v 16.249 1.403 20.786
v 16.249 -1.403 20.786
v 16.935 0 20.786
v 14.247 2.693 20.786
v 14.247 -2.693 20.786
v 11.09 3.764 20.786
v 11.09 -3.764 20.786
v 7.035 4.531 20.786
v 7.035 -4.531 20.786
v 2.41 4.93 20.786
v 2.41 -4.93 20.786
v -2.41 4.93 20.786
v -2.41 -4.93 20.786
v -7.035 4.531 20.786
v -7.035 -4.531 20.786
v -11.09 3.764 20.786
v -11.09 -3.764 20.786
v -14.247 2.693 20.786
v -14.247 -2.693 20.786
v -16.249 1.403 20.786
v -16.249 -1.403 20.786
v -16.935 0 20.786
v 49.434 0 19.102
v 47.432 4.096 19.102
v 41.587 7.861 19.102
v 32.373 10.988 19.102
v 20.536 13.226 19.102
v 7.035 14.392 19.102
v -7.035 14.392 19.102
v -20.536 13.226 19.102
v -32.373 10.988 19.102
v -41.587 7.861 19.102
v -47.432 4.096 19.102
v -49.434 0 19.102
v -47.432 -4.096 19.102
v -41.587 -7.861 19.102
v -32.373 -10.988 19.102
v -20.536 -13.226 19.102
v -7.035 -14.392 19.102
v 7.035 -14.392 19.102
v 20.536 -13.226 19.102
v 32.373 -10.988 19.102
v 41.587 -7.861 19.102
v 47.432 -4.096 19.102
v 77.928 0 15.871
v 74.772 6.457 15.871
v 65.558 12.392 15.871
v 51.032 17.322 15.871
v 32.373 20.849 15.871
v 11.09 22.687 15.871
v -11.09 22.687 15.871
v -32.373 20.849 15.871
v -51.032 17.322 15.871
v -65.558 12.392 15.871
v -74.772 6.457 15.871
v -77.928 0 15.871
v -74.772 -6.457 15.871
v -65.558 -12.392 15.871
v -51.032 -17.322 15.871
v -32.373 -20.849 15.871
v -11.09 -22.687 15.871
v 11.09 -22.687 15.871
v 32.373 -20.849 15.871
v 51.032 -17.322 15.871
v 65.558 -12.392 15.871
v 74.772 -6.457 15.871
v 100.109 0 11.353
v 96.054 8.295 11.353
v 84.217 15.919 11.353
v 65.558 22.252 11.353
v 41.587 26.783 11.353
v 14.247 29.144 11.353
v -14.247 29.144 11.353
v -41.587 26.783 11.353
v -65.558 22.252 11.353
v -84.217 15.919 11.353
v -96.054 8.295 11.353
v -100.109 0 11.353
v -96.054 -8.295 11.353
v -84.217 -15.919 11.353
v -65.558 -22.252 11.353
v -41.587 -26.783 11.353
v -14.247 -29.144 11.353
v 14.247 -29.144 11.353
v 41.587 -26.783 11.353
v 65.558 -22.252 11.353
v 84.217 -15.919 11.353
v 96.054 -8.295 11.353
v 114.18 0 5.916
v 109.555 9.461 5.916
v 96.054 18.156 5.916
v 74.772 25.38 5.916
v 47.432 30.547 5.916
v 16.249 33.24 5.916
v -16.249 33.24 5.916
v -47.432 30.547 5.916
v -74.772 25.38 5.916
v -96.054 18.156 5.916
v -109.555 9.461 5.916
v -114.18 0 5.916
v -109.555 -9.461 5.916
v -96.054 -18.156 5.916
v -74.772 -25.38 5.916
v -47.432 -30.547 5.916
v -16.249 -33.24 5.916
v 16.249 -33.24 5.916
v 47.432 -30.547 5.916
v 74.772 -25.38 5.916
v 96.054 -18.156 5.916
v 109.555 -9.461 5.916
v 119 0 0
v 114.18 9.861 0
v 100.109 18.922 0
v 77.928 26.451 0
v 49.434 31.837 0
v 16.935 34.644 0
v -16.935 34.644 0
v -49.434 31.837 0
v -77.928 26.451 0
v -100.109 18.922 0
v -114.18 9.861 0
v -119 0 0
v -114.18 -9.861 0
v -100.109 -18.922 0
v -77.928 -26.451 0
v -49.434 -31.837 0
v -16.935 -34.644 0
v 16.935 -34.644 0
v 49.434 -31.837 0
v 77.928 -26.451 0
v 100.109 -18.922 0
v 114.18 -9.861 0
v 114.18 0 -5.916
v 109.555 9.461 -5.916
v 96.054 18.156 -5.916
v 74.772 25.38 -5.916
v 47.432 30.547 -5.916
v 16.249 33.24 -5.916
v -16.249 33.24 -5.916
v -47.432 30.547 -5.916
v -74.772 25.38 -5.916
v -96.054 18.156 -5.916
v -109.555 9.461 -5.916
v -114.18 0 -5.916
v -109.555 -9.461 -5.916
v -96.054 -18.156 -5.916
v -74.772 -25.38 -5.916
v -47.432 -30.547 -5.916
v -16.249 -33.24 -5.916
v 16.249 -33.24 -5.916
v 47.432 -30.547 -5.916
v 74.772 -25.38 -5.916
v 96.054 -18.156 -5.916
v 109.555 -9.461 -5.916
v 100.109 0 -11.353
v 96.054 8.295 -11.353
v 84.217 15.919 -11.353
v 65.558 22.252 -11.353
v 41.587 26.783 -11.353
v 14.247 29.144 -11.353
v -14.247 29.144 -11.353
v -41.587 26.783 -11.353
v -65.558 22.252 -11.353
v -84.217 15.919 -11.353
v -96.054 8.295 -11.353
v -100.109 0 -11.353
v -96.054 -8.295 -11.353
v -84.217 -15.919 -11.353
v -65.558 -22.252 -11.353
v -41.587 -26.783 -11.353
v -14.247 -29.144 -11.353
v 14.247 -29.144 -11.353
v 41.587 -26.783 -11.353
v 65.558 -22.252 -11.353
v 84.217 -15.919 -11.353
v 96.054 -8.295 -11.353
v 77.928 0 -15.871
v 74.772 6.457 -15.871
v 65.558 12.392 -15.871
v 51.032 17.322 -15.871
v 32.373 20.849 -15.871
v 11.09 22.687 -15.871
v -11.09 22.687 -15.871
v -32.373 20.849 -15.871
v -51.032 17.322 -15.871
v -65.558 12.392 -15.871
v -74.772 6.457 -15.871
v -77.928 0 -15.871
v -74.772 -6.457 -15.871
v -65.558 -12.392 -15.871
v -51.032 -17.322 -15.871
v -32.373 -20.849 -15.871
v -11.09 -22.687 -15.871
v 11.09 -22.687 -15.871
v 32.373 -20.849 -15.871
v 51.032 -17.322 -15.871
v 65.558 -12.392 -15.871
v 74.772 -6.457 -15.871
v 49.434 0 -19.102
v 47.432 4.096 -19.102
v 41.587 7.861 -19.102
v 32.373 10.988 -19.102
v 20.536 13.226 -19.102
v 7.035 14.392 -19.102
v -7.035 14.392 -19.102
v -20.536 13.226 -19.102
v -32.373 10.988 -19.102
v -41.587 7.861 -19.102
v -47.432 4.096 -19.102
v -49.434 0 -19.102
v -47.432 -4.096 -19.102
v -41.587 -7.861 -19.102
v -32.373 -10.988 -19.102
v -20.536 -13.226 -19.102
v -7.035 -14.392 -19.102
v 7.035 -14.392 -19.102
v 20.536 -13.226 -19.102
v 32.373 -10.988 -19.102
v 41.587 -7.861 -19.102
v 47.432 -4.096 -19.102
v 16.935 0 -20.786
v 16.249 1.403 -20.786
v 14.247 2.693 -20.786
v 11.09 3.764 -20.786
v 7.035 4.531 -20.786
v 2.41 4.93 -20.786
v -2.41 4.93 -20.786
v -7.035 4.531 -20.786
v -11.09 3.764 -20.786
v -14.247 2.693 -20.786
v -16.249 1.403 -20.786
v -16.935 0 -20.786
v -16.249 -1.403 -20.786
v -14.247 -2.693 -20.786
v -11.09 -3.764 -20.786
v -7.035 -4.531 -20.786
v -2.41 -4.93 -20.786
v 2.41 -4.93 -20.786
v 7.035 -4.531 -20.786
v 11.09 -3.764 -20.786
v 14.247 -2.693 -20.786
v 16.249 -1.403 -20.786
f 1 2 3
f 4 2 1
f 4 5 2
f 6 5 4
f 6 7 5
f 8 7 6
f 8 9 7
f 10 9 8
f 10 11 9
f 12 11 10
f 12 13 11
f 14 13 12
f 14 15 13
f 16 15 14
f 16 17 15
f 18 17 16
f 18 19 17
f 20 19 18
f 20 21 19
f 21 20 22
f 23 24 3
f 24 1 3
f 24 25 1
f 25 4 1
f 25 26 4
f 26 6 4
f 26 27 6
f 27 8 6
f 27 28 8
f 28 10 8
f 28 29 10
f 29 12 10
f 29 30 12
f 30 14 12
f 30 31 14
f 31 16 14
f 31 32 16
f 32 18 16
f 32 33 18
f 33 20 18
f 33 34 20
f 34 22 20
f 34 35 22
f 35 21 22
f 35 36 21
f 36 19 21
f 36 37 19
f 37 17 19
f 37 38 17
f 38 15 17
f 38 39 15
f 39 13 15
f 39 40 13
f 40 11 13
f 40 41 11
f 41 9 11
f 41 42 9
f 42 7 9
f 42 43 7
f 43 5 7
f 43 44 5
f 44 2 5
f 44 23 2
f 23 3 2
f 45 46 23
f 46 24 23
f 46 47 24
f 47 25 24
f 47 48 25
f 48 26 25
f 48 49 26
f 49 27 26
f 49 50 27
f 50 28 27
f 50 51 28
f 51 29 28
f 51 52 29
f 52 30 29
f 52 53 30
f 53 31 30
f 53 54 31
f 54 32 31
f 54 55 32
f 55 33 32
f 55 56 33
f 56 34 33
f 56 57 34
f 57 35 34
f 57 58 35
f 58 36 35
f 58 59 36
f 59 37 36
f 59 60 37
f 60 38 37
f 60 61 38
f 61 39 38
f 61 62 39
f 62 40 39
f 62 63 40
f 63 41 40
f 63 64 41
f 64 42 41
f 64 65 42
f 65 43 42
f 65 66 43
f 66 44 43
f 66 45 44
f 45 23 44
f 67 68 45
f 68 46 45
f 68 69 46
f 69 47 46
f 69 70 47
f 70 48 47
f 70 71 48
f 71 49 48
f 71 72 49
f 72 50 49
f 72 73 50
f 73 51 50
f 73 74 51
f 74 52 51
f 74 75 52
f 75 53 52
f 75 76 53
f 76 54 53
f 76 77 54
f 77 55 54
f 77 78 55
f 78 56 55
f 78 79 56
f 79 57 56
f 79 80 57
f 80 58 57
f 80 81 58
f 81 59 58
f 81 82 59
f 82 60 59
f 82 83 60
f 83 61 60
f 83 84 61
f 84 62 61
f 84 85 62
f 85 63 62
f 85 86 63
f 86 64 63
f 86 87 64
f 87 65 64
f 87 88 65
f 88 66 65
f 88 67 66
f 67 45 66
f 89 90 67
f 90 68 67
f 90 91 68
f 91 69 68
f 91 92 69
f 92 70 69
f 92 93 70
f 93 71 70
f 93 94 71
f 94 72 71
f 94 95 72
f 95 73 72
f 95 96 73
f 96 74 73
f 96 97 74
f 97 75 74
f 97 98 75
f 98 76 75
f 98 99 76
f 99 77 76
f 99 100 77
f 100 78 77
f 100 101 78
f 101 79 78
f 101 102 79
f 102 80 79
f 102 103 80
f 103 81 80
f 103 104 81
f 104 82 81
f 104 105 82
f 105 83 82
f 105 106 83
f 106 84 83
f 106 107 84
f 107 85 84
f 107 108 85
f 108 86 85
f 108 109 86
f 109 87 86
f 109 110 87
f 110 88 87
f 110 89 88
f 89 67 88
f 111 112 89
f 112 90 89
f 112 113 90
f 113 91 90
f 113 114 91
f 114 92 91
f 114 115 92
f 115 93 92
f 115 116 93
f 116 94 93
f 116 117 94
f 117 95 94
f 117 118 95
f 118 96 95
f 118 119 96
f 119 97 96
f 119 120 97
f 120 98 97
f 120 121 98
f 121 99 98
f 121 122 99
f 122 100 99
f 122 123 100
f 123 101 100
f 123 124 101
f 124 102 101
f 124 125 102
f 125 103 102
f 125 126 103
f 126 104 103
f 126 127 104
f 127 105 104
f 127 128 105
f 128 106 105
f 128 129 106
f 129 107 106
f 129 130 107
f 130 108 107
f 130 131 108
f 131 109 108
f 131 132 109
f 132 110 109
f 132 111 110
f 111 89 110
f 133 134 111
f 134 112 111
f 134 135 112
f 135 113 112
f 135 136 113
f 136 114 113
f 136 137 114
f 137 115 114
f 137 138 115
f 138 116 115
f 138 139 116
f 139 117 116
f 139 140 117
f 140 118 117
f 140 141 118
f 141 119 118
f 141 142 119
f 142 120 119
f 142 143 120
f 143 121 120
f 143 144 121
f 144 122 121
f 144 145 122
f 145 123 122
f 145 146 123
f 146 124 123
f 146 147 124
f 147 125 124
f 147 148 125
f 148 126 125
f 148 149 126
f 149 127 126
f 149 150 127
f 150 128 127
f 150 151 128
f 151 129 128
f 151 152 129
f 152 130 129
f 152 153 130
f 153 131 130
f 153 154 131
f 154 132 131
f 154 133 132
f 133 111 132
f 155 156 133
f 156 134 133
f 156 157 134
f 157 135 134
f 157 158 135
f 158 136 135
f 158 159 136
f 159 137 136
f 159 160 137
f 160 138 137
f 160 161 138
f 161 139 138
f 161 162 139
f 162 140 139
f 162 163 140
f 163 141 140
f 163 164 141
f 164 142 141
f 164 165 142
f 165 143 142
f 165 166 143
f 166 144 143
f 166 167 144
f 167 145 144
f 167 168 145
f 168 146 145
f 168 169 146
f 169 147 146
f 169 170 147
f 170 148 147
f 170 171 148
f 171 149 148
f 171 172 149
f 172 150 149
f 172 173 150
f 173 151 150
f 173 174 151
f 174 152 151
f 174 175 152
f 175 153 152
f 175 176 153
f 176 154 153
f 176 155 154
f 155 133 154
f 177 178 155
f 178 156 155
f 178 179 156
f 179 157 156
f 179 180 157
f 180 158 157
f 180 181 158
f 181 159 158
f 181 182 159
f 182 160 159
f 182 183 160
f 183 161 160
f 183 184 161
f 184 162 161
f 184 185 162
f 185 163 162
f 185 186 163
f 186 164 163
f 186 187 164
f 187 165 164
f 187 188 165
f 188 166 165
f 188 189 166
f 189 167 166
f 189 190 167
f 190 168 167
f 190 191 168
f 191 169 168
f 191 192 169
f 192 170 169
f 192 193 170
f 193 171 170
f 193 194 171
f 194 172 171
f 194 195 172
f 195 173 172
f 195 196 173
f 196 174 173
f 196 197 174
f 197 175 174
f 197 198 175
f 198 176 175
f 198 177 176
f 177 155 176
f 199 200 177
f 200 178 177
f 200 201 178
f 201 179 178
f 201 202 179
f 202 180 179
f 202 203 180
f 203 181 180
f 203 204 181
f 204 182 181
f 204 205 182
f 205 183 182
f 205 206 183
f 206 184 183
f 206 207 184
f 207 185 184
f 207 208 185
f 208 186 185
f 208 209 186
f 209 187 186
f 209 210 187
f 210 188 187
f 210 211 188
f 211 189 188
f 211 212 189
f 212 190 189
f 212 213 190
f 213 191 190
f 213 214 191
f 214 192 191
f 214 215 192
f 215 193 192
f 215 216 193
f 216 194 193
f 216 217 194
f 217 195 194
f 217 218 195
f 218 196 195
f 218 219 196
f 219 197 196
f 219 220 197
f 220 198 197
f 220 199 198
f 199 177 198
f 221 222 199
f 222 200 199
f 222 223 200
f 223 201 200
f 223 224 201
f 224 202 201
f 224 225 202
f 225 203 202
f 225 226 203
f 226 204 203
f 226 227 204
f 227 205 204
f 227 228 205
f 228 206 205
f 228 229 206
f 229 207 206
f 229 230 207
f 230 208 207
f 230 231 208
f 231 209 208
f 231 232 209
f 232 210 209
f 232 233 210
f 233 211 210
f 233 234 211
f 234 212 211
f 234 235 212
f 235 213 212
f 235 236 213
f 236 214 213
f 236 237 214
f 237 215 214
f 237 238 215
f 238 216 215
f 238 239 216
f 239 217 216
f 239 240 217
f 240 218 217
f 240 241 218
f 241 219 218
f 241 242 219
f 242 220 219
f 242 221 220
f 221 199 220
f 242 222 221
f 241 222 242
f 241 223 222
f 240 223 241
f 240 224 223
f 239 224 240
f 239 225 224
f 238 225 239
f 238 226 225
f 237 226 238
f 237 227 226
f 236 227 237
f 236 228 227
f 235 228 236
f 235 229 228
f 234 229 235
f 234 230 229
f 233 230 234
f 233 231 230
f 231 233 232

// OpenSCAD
// Generated by SolidPython 1.0.1 on 2020-07-29 00:46:52


scale(v = [17, 5, 3]) {
	sphere(r = 7);
}
/***********************************************
*********      SolidPython code:      **********
************************************************
 
# import packages: SolidPython
from solid import *
from solid.utils import *
from itertools import chain, combinations, permutations


class Resize:

    def __init__(self, scad_file):
        self.scad_file = scad_file
        #self.scad_file = import_scad(scad_file)
        # cone/cylinder param:
        self.r1 = 0
        self.r2 = 0
        self.h = 0
        # rectangular prism param:
        self.w = 0
        self.l = 0
        # ellipse param:
        self.r = 0

    # import OpenScad code (file name corresponds to shape)


    # classify shape + parameters
    def assign(self, param1, param2, param3):
        if self.scad_file == 'cone.scad':
            self.r1 = param1
            self.r2 = param2
            self.h = param3
        elif self.scad_file == 'cylinder.scad':
            self.r1 = param1
            self.r2 = param2
            self.h = param3
        elif self.scad_file == 'rectangularPrism.scad':
            self.h = param1
            self.l = param2
            self.w = param3
        else:
            self.r = param1
            self.h = param2

    # resize parameters
    def iterate(self):
        x = range(3, 20, 2)
        i = 1
        if self.scad_file == 'cone.scad':
            tempList = list(permutations(x, 2))
            for temp in tempList:
                param1 = temp[0]
                param2 = temp[1]
                filepath = 'produced_scad_files/' + 'cone' + str(param1) + '_' + str(param2) + '_' + '.scad'
                scad_render_to_file(cylinder(h=param1, r1=param2, r2=0), filepath)

        elif self.scad_file == 'cylinder.scad':
            tempList = list(permutations(x, 3))
            for temp in tempList:
                param1 = temp[0]
                param2 = temp[1]
                filepath = 'produced_scad_files/' + 'cylinder' + str(param1) + '_' + str(param2) + '_' + '.scad'
                scad_render_to_file(cylinder(h=param1, r1=param2, r2=param2), filepath)

        elif self.scad_file == 'rectangularPrism.scad':
            tempList = list(permutations(x, 3))
            for temp in tempList:
                param1 = temp[0]
                param2 = temp[1]
                param3 = temp[2]
                filepath = 'produced_scad_files/' + 'rectangularPrism' + str(param1) + '_' + str(param2) + '_' + str(
                    param3) + '.scad'
                scad_render_to_file(cube(size=(param1, param2, param3)), filepath)

        elif self.scad_file == 'ellipse.scad':
            tempList = list(permutations(x, 4))
            for temp in tempList:
                param1 = temp[0]
                param2 = temp[1]
                param3 = temp[2]
                param4 = temp[3]
                filepath = 'produced_scad_files/' + 'ellipse' + str(param1) + '_' + str(param2) + '_' + str(param3) + '_' + str(param4) + '.scad'
                scad_render_to_file(scale([param1, param2, param3])(sphere(r=param4)), filepath)

    def render_to_scadfile(self):
        scad_render_to_file(scad, 'example.scad') 
 
************************************************/
